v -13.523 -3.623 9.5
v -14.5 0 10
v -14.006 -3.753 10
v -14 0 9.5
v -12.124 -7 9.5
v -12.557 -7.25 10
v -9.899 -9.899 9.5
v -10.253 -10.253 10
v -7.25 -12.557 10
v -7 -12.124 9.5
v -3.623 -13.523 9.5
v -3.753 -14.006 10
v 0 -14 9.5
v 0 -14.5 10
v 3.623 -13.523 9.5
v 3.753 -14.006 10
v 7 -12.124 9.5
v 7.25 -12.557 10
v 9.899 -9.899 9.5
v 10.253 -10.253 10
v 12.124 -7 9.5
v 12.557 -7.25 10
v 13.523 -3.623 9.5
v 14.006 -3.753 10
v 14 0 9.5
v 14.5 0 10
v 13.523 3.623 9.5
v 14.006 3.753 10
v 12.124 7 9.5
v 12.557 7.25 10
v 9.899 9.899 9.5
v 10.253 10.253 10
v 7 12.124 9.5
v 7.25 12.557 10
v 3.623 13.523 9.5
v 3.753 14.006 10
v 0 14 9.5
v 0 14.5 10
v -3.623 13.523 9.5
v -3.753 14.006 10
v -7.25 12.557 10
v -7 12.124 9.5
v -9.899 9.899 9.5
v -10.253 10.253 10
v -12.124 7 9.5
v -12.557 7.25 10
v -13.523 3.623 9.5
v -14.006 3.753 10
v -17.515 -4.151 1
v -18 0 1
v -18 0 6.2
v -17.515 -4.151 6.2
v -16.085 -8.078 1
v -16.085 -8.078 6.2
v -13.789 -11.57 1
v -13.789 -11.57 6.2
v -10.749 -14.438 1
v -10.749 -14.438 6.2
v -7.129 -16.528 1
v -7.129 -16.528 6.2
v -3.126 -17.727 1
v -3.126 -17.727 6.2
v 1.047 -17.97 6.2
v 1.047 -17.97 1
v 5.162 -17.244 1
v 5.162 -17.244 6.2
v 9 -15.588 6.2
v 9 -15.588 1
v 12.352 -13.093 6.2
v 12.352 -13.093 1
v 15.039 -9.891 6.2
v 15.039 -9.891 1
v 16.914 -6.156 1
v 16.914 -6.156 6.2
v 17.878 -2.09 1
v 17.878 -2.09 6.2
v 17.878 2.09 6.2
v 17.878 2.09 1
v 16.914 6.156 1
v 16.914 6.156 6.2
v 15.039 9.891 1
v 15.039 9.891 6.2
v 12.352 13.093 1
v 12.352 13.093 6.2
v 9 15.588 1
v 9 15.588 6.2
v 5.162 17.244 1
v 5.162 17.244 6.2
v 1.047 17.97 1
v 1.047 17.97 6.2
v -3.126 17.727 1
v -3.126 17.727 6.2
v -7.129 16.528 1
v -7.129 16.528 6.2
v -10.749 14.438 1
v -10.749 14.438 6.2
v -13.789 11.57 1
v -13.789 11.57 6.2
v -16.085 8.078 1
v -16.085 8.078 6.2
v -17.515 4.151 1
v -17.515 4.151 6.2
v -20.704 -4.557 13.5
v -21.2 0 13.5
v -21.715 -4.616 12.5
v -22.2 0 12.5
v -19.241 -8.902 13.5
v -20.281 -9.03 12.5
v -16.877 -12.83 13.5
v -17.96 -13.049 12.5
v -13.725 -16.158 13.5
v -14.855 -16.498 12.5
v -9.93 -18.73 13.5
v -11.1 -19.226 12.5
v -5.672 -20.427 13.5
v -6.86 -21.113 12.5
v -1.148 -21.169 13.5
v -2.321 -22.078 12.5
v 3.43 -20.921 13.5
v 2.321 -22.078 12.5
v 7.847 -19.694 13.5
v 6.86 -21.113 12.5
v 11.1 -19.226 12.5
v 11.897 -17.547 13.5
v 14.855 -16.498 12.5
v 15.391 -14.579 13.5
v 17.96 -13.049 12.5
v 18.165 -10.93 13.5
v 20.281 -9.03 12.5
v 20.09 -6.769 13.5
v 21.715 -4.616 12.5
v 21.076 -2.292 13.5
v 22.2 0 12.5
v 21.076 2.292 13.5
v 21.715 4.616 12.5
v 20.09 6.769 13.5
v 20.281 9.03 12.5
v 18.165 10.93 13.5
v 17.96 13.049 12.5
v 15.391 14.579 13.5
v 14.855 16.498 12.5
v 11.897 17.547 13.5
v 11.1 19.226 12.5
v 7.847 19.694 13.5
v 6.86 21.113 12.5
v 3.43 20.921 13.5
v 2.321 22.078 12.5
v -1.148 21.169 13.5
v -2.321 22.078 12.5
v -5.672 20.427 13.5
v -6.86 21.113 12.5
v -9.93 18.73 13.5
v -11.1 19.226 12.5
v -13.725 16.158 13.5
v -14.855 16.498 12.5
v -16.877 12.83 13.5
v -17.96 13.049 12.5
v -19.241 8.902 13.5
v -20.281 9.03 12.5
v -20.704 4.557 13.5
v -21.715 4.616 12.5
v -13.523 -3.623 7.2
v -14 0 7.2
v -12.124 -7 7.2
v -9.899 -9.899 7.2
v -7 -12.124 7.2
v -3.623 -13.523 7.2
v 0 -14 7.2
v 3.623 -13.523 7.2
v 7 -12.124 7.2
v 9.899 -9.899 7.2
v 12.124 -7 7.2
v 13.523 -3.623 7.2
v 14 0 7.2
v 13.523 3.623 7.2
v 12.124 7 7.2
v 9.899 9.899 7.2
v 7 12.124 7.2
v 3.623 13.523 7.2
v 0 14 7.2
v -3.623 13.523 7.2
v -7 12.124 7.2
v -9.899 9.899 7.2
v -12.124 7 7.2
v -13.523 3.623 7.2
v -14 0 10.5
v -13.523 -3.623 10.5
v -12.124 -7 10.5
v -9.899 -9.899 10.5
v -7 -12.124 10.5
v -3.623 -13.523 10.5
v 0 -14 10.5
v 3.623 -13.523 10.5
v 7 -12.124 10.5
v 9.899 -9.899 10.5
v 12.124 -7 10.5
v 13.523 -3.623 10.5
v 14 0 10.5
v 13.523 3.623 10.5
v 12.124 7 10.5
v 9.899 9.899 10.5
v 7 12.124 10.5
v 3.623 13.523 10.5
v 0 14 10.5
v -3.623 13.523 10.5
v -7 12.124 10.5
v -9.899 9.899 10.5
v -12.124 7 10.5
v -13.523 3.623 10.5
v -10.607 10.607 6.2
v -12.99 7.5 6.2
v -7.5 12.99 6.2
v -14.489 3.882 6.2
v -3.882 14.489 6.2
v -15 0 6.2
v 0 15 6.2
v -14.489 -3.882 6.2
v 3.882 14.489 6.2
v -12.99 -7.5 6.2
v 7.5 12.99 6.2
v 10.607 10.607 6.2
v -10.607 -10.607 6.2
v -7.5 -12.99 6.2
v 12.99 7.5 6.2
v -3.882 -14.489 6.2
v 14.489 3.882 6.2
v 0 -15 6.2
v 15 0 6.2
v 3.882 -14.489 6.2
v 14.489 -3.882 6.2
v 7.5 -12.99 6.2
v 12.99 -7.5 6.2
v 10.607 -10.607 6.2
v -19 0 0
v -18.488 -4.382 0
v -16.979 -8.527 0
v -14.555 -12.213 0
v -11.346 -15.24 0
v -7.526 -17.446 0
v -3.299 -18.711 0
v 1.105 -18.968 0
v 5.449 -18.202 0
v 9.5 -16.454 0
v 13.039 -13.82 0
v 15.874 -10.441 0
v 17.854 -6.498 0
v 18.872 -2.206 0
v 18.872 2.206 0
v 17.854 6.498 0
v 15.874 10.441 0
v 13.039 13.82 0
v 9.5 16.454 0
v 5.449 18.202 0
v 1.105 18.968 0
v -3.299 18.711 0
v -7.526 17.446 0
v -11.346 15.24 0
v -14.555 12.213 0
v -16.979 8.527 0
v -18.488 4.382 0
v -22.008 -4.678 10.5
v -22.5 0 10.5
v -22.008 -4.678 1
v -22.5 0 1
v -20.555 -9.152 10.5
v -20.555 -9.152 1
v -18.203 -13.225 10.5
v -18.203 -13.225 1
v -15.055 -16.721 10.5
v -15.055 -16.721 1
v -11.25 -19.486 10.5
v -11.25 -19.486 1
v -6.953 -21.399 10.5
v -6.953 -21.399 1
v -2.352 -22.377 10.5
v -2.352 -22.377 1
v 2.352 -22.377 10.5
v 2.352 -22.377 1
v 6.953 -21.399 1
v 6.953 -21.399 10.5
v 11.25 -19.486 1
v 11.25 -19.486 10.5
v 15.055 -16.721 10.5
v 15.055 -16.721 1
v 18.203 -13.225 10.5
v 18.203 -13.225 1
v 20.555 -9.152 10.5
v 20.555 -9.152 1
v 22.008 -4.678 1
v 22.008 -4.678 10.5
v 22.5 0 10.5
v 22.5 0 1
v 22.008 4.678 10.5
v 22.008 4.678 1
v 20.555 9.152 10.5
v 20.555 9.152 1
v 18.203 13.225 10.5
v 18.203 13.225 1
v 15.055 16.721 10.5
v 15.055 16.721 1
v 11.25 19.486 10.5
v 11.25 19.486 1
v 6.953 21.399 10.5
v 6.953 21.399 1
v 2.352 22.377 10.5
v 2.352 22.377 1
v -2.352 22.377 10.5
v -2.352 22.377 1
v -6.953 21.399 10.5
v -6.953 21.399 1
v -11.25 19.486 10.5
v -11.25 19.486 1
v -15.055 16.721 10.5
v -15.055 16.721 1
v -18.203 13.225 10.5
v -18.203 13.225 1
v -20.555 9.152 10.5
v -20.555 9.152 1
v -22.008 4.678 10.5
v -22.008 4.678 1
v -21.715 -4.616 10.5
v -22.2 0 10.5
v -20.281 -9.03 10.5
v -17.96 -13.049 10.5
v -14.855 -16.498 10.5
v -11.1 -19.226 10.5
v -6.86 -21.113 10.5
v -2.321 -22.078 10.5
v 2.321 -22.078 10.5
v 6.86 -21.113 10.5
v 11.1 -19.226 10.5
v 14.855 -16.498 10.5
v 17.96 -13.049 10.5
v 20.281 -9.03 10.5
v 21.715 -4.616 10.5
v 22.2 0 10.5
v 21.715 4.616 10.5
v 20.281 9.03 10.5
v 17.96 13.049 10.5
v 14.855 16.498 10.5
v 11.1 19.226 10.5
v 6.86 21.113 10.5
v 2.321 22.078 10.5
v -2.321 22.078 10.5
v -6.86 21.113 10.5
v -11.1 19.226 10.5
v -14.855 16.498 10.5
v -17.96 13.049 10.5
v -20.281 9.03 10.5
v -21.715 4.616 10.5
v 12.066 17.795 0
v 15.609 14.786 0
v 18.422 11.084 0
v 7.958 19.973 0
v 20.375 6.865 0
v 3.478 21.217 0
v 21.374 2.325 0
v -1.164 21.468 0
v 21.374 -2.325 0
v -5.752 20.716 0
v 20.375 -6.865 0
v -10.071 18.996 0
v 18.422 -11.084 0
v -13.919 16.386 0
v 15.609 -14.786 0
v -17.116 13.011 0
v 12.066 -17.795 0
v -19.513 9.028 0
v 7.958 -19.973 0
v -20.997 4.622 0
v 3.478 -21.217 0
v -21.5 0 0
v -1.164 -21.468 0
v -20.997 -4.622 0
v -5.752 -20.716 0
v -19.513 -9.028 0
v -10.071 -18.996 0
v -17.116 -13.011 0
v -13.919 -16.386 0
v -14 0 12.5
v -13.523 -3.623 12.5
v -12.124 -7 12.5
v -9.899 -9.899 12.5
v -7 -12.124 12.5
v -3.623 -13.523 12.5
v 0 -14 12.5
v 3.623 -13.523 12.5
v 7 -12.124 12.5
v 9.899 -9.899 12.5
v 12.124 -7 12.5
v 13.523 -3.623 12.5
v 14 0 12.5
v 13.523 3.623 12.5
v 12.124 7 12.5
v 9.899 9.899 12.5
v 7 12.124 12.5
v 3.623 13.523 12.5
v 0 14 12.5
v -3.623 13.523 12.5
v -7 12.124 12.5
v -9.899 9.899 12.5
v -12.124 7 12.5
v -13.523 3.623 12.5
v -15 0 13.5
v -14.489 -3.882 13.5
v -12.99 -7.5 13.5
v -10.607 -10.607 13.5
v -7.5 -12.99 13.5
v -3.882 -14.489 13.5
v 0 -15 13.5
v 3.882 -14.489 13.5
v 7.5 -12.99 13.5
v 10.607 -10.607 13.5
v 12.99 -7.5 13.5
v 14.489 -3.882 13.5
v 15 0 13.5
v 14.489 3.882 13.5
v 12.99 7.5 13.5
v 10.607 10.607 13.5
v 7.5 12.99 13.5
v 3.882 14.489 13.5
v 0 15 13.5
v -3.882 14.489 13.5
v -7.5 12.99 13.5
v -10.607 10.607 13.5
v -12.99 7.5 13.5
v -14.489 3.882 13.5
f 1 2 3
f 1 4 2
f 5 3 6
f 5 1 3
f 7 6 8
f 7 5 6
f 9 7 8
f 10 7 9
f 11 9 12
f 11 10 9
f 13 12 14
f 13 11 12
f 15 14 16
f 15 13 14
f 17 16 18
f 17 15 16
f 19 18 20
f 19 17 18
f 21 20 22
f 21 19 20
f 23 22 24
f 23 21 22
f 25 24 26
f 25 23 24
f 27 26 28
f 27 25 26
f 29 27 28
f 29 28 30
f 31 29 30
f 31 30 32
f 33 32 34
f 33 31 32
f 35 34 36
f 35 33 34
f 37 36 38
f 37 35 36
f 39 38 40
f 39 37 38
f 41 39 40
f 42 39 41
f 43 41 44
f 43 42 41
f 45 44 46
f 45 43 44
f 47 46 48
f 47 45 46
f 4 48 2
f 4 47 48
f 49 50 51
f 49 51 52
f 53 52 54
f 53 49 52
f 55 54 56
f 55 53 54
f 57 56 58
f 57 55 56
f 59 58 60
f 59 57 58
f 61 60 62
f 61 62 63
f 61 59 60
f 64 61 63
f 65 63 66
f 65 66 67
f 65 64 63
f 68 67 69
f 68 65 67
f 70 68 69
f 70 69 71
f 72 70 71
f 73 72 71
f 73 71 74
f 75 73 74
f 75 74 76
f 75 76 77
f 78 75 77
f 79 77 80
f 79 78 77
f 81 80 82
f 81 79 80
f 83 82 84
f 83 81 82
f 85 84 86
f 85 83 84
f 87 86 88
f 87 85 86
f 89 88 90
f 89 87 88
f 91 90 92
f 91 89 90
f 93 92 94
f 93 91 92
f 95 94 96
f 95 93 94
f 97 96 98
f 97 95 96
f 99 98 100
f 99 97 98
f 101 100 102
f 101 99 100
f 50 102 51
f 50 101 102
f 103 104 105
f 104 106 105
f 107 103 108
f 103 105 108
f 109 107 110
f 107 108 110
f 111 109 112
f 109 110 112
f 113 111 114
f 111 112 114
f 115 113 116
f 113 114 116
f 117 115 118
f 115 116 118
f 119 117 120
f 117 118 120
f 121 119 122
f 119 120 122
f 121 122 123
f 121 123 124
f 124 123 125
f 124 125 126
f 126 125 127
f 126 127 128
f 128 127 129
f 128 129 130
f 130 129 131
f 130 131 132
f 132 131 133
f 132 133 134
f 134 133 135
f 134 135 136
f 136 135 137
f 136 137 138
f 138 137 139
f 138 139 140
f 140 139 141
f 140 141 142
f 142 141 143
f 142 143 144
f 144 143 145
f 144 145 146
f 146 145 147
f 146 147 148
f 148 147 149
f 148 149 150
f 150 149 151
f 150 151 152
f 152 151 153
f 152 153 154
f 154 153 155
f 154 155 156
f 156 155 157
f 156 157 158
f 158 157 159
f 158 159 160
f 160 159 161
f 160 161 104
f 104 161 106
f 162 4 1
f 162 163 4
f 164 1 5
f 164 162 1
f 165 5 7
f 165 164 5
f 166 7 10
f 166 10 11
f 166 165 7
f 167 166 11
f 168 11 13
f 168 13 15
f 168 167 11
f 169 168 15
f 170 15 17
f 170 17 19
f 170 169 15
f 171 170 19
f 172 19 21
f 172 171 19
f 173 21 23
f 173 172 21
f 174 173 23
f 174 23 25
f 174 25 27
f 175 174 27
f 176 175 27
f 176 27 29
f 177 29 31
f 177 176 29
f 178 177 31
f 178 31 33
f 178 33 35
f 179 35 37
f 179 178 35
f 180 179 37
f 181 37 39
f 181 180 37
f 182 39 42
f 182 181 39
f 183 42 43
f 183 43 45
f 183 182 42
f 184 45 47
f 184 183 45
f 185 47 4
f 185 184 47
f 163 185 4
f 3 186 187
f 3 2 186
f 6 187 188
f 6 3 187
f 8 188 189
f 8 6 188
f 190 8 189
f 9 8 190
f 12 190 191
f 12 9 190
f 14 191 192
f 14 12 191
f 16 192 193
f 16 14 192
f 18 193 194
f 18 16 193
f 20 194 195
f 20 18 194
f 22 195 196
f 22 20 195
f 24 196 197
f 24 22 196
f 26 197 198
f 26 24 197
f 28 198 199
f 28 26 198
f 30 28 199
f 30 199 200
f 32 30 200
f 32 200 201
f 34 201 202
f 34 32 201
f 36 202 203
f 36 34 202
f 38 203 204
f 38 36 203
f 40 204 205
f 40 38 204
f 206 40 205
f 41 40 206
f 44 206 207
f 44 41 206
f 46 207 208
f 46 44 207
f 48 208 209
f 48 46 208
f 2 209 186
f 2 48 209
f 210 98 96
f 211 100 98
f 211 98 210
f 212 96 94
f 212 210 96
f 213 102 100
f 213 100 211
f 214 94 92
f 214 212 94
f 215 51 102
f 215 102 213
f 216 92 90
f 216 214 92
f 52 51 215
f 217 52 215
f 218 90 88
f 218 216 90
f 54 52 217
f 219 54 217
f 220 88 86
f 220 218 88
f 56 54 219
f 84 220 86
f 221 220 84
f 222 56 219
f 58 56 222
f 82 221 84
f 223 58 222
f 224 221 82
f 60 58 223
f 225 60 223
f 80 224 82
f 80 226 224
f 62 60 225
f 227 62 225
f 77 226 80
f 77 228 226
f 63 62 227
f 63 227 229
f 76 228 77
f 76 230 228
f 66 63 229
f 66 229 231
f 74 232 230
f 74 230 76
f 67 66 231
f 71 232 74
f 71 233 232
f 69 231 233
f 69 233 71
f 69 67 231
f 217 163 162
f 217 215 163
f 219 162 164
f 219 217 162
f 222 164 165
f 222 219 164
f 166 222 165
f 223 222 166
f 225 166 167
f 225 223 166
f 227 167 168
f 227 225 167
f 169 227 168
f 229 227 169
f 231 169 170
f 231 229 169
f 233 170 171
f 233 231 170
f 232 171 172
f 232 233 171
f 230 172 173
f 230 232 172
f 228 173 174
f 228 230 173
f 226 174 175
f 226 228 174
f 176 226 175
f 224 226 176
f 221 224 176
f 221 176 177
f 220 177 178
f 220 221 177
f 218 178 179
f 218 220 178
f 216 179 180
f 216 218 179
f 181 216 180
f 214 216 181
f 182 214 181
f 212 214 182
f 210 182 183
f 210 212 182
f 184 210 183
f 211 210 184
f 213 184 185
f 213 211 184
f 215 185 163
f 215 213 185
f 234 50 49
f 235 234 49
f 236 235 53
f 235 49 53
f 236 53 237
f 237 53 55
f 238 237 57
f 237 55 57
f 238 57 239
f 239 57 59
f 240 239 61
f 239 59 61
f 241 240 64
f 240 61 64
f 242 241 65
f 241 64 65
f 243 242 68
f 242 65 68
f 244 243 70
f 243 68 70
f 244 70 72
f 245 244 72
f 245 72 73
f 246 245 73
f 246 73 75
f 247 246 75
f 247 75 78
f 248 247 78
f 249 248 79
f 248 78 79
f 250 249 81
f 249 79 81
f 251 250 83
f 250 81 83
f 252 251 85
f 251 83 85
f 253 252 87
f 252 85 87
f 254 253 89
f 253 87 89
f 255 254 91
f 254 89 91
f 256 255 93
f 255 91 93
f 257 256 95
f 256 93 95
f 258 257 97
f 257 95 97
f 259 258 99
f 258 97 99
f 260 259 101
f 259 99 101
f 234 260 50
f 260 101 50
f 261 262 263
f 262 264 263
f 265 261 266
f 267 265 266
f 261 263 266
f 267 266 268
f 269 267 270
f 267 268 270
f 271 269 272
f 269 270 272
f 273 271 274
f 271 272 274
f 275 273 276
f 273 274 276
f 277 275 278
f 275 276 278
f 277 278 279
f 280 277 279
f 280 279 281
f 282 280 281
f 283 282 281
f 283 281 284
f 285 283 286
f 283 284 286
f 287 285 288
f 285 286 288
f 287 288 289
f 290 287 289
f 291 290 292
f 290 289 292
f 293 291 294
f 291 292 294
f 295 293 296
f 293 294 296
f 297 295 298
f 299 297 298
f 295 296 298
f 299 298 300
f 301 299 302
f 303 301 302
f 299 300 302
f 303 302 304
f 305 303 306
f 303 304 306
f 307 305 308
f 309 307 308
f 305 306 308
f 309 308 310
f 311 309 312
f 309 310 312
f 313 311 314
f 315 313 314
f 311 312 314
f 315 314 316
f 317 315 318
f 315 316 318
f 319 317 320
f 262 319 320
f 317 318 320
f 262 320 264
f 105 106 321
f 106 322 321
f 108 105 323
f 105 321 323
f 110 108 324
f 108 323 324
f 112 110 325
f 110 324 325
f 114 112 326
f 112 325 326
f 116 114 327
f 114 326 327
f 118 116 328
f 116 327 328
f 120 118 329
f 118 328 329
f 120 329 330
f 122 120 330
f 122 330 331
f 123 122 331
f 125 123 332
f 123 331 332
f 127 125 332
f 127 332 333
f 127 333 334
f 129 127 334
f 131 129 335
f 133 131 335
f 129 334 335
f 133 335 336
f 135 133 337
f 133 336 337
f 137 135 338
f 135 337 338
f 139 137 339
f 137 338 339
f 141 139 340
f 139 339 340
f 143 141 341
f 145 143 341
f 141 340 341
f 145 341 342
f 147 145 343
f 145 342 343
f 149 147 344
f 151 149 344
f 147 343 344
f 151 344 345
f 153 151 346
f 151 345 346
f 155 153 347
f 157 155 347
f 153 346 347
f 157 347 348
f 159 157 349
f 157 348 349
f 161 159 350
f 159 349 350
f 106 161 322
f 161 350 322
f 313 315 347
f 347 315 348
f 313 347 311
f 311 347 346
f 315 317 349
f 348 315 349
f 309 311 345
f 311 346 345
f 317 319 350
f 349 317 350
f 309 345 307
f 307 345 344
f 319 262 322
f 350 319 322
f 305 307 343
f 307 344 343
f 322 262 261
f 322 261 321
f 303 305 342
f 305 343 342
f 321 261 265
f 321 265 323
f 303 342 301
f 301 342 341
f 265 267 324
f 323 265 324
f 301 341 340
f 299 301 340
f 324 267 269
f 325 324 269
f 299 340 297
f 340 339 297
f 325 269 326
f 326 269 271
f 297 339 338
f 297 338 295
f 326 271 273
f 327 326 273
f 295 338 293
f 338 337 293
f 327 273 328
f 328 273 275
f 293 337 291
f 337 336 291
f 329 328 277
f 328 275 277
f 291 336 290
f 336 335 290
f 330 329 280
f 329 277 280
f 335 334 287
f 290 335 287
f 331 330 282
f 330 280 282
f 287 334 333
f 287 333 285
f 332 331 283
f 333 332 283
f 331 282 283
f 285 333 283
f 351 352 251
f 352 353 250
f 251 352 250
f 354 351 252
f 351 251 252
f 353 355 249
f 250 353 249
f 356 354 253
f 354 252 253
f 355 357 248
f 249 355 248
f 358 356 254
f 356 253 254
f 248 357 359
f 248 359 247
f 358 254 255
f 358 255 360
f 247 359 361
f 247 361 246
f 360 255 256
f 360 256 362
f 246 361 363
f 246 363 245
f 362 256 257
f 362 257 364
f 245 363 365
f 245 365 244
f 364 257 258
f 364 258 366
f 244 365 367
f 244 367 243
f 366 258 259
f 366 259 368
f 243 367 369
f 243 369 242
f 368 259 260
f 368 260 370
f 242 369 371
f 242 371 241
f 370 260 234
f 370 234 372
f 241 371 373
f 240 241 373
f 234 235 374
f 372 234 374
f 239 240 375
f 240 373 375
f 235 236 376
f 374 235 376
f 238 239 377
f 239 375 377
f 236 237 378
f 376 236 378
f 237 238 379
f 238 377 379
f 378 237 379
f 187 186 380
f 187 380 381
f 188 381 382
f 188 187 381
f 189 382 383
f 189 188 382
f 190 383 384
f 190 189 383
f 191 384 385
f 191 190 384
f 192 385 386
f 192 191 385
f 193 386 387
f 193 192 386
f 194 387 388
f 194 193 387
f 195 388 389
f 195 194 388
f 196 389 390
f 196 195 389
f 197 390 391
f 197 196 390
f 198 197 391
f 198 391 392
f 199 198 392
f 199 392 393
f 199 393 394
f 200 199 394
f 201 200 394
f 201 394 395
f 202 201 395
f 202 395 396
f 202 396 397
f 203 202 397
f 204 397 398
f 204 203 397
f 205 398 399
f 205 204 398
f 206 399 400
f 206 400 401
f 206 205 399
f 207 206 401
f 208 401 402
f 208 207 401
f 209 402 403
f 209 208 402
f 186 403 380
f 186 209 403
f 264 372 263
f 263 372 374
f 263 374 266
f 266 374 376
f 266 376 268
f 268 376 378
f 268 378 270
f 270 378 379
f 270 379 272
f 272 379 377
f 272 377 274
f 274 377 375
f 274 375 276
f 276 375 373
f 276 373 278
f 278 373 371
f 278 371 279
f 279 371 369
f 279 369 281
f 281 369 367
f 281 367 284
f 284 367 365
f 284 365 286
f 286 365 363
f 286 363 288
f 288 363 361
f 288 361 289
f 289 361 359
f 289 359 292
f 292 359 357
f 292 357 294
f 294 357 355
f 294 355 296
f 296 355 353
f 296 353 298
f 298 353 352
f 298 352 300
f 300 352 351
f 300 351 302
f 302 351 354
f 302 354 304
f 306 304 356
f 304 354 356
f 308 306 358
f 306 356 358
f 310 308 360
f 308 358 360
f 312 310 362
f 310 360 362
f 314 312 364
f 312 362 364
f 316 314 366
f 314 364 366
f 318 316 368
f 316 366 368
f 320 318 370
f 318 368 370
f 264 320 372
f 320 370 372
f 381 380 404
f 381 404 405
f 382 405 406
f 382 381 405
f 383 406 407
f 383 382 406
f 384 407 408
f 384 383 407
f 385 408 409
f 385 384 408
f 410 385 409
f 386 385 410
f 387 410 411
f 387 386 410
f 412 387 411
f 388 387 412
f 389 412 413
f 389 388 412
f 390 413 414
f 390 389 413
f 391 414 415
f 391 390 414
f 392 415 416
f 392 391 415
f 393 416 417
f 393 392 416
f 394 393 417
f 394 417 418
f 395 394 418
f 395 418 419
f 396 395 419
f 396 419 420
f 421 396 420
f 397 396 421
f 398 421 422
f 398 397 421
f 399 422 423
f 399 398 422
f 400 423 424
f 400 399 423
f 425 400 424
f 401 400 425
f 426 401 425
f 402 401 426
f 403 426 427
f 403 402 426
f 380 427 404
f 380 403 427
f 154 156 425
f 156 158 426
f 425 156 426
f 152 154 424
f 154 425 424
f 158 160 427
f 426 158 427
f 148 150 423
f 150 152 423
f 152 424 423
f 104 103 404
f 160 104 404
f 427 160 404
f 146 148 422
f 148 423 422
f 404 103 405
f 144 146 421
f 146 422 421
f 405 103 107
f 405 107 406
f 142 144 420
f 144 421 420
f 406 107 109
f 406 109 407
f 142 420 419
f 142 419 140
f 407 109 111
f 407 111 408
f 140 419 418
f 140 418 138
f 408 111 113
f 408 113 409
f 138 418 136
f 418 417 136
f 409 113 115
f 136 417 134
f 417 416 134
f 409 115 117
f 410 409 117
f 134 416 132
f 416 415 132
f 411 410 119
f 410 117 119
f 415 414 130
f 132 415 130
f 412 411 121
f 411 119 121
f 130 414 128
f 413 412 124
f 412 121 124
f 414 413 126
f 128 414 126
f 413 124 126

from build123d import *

# Parameters (mm, degrees)
CHAMFER1_SIZE = 1


with BuildPart() as part:
    # Sketch1 → Revolve1 (revolve)
    with BuildSketch(Plane(origin=(0, 0, 0), x_dir=(0, 0, -1), z_dir=(1, 0, 0)), mode=Mode.PRIVATE) as revolve1_sk:
        Polygon((0, 0), (-13.5, 0), (-13.5, 21.2), (-12.5, 22.2), (-10.5, 22.2), (-10.5, 22.5), (-1, 22.5), (0, 21.5), align=None)
    revolve(revolve1_sk.sketch.rotate(Axis((0, 0, 0), (0, 0, 1)), 90), axis=Axis((0, 0, 0), (0, 0, 1)))

    # Sketch2 → Cut-Revolve1 (revolve, cut)
    with BuildSketch(Plane(origin=(0, 0, 0), x_dir=(0, 0, -1), z_dir=(1, 0, 0)), mode=Mode.PRIVATE) as cut_revolve1_sk:
        Polygon((0, 0), (-13.5, 0), (-13.5, 14), (-10.5, 14), (-10, 14.5), (-9.5, 14), (-7.2, 14), (-6.2, 15), (-6.2, 18), (0, 18), align=None)
    revolve(cut_revolve1_sk.sketch.rotate(Axis((0, 0, 0), (0, 0, 1)), 90), axis=Axis((0, 0, 0), (0, 0, 1)), mode=Mode.SUBTRACT)

    # Chamfer1
    chamfer1_edges = [part.edges().sort_by_distance(p)[0] for p in [
        (18, 0, 0),
        (14, 0, 13.5),
    ]]
    chamfer(chamfer1_edges, length=CHAMFER1_SIZE)


solid = part.part
